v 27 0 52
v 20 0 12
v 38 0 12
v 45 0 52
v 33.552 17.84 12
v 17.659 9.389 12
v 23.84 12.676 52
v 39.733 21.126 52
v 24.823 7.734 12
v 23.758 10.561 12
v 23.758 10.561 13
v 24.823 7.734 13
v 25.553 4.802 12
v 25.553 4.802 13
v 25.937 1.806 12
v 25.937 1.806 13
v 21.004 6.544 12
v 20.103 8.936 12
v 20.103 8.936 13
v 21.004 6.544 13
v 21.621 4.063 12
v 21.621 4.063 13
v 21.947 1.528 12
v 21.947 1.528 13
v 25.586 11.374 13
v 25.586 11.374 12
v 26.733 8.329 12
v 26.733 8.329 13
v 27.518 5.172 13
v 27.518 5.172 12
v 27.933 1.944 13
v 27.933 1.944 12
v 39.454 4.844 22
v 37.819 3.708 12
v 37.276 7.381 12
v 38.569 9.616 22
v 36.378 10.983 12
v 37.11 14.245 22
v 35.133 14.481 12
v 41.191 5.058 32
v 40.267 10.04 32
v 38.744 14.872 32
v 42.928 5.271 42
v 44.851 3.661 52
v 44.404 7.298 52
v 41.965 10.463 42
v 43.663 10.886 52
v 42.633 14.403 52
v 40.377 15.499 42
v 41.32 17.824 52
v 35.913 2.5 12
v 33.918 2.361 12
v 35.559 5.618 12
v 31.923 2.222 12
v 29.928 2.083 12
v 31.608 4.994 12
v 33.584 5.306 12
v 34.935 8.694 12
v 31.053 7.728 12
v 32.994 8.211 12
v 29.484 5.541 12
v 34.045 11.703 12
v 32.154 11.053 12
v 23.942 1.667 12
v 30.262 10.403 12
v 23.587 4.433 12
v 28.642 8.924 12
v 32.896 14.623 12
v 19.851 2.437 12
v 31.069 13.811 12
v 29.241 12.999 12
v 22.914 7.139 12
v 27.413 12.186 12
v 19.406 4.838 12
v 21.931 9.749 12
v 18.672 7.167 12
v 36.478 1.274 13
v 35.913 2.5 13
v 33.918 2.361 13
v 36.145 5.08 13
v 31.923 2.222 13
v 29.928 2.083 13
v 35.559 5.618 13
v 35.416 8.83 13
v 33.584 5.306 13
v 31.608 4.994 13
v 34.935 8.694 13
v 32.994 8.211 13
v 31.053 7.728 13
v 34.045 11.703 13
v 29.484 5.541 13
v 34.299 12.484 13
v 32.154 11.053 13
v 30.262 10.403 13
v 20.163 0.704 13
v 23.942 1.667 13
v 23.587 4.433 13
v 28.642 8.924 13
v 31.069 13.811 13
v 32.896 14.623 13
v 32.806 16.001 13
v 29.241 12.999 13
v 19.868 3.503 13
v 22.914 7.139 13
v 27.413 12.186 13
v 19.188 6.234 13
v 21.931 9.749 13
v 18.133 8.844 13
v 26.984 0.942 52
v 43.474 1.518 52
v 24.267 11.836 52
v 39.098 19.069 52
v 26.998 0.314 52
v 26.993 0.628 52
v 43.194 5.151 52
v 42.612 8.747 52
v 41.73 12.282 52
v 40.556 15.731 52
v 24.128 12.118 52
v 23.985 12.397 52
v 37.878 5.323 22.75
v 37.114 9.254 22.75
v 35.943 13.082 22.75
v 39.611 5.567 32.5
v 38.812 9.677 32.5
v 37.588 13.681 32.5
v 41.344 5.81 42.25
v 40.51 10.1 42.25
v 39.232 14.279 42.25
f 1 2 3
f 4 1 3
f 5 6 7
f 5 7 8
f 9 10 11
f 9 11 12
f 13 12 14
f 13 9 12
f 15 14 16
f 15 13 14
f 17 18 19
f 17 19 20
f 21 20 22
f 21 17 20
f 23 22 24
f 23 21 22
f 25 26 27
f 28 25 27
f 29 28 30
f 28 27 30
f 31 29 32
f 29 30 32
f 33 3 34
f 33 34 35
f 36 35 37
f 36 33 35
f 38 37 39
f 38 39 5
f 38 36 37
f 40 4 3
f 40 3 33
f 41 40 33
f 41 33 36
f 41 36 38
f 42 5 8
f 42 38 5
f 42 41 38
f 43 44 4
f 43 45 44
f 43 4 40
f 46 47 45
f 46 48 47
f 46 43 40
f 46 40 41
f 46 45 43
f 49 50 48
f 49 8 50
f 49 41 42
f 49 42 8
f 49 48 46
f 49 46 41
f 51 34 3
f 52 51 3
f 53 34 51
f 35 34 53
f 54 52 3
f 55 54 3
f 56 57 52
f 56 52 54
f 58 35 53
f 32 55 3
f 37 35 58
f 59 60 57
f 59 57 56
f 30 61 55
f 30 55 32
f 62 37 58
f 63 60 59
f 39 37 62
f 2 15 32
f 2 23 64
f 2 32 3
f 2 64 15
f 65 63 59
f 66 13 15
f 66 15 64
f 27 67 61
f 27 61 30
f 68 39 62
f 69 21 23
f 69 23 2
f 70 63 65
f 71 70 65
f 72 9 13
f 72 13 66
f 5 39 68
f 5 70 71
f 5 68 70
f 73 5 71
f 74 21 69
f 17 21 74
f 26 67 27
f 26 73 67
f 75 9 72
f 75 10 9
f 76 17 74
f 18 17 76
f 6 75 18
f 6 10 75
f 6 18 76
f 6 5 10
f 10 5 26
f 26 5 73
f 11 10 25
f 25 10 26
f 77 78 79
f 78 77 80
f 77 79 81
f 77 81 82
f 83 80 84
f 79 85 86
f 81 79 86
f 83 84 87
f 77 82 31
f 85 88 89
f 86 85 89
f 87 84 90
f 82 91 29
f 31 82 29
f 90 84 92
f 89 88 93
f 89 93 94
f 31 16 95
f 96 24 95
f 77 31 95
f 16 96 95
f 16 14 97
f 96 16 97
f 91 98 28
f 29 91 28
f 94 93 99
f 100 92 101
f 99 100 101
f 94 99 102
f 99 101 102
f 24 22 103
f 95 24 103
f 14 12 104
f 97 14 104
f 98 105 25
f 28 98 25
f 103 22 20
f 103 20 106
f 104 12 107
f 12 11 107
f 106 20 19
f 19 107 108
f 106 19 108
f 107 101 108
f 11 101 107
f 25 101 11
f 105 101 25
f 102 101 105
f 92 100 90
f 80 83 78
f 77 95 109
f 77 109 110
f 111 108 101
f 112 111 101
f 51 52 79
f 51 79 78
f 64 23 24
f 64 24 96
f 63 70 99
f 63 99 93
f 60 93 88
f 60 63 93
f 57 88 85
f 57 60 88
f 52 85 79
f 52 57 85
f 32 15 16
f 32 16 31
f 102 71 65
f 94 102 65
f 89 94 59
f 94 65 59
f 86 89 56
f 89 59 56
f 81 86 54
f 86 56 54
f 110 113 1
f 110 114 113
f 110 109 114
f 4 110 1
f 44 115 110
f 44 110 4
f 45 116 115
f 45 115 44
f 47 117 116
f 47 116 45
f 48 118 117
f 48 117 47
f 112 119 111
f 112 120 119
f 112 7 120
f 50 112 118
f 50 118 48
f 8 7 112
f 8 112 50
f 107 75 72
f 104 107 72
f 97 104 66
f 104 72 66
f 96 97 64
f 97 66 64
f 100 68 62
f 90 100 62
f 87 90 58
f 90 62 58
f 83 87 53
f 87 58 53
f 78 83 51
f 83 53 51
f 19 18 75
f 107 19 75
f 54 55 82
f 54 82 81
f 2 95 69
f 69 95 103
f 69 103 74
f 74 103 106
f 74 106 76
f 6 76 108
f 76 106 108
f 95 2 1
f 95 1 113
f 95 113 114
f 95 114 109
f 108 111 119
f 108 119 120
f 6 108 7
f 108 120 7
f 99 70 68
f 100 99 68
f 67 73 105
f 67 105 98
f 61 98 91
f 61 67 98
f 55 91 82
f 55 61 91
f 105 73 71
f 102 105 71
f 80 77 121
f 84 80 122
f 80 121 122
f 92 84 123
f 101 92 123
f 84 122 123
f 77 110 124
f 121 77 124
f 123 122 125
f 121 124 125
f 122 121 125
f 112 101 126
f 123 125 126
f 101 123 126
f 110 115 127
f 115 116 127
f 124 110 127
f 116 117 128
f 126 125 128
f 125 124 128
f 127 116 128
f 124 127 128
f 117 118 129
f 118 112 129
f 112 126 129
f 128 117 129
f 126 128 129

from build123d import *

# Parameters (mm, degrees)
CONE006_ANGLE           = 28
CONE003_ANGLE           = 24
CONE003_PLACEMENT_ANGLE = 1.999999
CONE002_ANGLE           = 28
POCKET_DEPTH            = 5


with BuildPart() as indre_total_cutter:
    # Cone006 → Cone006 (revolve)
    with BuildSketch(Plane(origin=(0, 0, 12), x_dir=(1, 0, 0), z_dir=(0, -1, 0))):
        Polygon((0, 0), (20, 0), (27, 40), (0, 40), align=None)
    revolve(axis=Axis((0, 0, 12), (0, 0, 1)), revolution_arc=CONE006_ANGLE)


with BuildPart() as ydre_v_g_og_bund_cutter:
    # Cone003 → Cone003 (revolve)
    with BuildSketch(Plane.XZ):
        Polygon((0, 0), (36.5, 0), (43.5, 39), (0, 39), align=None)
    revolve(axis=Axis((0, 0, 0), (0, 0, 1)), revolution_arc=CONE003_ANGLE)


with BuildPart() as ydre_v_g_og_bund_cutter_1:
    # Cone003 placement: moved
    add(ydre_v_g_og_bund_cutter.part.moved(Location((0, 0, 13))).rotate(Axis((0, 0, 13), (0, 0, 1)), CONE003_PLACEMENT_ANGLE))


with BuildPart() as bundhullet_bund:
    # Cone002 → Cone002 (revolve)
    with BuildSketch(Plane(origin=(0, 0, 12), x_dir=(1, 0, 0), z_dir=(0, -1, 0))):
        Polygon((0, 0), (38, 0), (45, 40), (0, 40), align=None)
    revolve(axis=Axis((0, 0, 12), (0, 0, 1)), revolution_arc=CONE002_ANGLE)

    # Cut001: cut Ydre væg og bund cutter
    add(ydre_v_g_og_bund_cutter_1.part, mode=Mode.SUBTRACT)

    # Cut003: cut Indre total cutter
    add(indre_total_cutter.part, mode=Mode.SUBTRACT)

    # Sketch011 → Pocket (cut)
    with BuildSketch(Plane(origin=(0, 0, 12), x_dir=(1, 0, 0), z_dir=(0, 0, -1))):
        with BuildLine():
            ThreePointArc((20.103216, -8.936482), (21.348889, -5.312713), (21.946889, -1.527769))
            Line((21.946889, -1.527769), (23.94206, -1.666658))
            ThreePointArc((21.930781, -9.748889), (23.289698, -5.795687), (23.94206, -1.666658))
            Line((20.103216, -8.936482), (21.930781, -9.748889))
        make_face()
        with BuildLine():
            ThreePointArc((23.758346, -10.561297), (25.230506, -6.278661), (25.937232, -1.805546))
            Line((25.937232, -1.805546), (27.932594, -1.944447))
            ThreePointArc((25.586086, -11.373782), (27.171499, -6.761681), (27.932594, -1.944447))
            Line((23.758346, -10.561297), (25.586086, -11.373782))
        make_face()
        with BuildLine():
            ThreePointArc((27.413476, -12.186112), (29.112122, -7.244609), (29.927575, -2.083322))
            Line((29.927575, -2.083322), (31.922747, -2.22221))
            ThreePointArc((29.241041, -12.998519), (31.05293, -7.727583), (31.922747, -2.22221))
            Line((27.413476, -12.186112), (29.241041, -12.998519))
        make_face()
        with BuildLine():
            ThreePointArc((31.068797, -13.811011), (32.993941, -8.210607), (33.918127, -2.361113))
            Line((33.918127, -2.361113), (35.913287, -2.5))
            ThreePointArc((32.896352, -14.623414), (34.934737, -8.693578), (35.913287, -2.5))
            Line((31.068797, -13.811011), (32.896352, -14.623414))
        make_face()
    extrude(amount=-POCKET_DEPTH, mode=Mode.SUBTRACT)


solid = bundhullet_bund.part
